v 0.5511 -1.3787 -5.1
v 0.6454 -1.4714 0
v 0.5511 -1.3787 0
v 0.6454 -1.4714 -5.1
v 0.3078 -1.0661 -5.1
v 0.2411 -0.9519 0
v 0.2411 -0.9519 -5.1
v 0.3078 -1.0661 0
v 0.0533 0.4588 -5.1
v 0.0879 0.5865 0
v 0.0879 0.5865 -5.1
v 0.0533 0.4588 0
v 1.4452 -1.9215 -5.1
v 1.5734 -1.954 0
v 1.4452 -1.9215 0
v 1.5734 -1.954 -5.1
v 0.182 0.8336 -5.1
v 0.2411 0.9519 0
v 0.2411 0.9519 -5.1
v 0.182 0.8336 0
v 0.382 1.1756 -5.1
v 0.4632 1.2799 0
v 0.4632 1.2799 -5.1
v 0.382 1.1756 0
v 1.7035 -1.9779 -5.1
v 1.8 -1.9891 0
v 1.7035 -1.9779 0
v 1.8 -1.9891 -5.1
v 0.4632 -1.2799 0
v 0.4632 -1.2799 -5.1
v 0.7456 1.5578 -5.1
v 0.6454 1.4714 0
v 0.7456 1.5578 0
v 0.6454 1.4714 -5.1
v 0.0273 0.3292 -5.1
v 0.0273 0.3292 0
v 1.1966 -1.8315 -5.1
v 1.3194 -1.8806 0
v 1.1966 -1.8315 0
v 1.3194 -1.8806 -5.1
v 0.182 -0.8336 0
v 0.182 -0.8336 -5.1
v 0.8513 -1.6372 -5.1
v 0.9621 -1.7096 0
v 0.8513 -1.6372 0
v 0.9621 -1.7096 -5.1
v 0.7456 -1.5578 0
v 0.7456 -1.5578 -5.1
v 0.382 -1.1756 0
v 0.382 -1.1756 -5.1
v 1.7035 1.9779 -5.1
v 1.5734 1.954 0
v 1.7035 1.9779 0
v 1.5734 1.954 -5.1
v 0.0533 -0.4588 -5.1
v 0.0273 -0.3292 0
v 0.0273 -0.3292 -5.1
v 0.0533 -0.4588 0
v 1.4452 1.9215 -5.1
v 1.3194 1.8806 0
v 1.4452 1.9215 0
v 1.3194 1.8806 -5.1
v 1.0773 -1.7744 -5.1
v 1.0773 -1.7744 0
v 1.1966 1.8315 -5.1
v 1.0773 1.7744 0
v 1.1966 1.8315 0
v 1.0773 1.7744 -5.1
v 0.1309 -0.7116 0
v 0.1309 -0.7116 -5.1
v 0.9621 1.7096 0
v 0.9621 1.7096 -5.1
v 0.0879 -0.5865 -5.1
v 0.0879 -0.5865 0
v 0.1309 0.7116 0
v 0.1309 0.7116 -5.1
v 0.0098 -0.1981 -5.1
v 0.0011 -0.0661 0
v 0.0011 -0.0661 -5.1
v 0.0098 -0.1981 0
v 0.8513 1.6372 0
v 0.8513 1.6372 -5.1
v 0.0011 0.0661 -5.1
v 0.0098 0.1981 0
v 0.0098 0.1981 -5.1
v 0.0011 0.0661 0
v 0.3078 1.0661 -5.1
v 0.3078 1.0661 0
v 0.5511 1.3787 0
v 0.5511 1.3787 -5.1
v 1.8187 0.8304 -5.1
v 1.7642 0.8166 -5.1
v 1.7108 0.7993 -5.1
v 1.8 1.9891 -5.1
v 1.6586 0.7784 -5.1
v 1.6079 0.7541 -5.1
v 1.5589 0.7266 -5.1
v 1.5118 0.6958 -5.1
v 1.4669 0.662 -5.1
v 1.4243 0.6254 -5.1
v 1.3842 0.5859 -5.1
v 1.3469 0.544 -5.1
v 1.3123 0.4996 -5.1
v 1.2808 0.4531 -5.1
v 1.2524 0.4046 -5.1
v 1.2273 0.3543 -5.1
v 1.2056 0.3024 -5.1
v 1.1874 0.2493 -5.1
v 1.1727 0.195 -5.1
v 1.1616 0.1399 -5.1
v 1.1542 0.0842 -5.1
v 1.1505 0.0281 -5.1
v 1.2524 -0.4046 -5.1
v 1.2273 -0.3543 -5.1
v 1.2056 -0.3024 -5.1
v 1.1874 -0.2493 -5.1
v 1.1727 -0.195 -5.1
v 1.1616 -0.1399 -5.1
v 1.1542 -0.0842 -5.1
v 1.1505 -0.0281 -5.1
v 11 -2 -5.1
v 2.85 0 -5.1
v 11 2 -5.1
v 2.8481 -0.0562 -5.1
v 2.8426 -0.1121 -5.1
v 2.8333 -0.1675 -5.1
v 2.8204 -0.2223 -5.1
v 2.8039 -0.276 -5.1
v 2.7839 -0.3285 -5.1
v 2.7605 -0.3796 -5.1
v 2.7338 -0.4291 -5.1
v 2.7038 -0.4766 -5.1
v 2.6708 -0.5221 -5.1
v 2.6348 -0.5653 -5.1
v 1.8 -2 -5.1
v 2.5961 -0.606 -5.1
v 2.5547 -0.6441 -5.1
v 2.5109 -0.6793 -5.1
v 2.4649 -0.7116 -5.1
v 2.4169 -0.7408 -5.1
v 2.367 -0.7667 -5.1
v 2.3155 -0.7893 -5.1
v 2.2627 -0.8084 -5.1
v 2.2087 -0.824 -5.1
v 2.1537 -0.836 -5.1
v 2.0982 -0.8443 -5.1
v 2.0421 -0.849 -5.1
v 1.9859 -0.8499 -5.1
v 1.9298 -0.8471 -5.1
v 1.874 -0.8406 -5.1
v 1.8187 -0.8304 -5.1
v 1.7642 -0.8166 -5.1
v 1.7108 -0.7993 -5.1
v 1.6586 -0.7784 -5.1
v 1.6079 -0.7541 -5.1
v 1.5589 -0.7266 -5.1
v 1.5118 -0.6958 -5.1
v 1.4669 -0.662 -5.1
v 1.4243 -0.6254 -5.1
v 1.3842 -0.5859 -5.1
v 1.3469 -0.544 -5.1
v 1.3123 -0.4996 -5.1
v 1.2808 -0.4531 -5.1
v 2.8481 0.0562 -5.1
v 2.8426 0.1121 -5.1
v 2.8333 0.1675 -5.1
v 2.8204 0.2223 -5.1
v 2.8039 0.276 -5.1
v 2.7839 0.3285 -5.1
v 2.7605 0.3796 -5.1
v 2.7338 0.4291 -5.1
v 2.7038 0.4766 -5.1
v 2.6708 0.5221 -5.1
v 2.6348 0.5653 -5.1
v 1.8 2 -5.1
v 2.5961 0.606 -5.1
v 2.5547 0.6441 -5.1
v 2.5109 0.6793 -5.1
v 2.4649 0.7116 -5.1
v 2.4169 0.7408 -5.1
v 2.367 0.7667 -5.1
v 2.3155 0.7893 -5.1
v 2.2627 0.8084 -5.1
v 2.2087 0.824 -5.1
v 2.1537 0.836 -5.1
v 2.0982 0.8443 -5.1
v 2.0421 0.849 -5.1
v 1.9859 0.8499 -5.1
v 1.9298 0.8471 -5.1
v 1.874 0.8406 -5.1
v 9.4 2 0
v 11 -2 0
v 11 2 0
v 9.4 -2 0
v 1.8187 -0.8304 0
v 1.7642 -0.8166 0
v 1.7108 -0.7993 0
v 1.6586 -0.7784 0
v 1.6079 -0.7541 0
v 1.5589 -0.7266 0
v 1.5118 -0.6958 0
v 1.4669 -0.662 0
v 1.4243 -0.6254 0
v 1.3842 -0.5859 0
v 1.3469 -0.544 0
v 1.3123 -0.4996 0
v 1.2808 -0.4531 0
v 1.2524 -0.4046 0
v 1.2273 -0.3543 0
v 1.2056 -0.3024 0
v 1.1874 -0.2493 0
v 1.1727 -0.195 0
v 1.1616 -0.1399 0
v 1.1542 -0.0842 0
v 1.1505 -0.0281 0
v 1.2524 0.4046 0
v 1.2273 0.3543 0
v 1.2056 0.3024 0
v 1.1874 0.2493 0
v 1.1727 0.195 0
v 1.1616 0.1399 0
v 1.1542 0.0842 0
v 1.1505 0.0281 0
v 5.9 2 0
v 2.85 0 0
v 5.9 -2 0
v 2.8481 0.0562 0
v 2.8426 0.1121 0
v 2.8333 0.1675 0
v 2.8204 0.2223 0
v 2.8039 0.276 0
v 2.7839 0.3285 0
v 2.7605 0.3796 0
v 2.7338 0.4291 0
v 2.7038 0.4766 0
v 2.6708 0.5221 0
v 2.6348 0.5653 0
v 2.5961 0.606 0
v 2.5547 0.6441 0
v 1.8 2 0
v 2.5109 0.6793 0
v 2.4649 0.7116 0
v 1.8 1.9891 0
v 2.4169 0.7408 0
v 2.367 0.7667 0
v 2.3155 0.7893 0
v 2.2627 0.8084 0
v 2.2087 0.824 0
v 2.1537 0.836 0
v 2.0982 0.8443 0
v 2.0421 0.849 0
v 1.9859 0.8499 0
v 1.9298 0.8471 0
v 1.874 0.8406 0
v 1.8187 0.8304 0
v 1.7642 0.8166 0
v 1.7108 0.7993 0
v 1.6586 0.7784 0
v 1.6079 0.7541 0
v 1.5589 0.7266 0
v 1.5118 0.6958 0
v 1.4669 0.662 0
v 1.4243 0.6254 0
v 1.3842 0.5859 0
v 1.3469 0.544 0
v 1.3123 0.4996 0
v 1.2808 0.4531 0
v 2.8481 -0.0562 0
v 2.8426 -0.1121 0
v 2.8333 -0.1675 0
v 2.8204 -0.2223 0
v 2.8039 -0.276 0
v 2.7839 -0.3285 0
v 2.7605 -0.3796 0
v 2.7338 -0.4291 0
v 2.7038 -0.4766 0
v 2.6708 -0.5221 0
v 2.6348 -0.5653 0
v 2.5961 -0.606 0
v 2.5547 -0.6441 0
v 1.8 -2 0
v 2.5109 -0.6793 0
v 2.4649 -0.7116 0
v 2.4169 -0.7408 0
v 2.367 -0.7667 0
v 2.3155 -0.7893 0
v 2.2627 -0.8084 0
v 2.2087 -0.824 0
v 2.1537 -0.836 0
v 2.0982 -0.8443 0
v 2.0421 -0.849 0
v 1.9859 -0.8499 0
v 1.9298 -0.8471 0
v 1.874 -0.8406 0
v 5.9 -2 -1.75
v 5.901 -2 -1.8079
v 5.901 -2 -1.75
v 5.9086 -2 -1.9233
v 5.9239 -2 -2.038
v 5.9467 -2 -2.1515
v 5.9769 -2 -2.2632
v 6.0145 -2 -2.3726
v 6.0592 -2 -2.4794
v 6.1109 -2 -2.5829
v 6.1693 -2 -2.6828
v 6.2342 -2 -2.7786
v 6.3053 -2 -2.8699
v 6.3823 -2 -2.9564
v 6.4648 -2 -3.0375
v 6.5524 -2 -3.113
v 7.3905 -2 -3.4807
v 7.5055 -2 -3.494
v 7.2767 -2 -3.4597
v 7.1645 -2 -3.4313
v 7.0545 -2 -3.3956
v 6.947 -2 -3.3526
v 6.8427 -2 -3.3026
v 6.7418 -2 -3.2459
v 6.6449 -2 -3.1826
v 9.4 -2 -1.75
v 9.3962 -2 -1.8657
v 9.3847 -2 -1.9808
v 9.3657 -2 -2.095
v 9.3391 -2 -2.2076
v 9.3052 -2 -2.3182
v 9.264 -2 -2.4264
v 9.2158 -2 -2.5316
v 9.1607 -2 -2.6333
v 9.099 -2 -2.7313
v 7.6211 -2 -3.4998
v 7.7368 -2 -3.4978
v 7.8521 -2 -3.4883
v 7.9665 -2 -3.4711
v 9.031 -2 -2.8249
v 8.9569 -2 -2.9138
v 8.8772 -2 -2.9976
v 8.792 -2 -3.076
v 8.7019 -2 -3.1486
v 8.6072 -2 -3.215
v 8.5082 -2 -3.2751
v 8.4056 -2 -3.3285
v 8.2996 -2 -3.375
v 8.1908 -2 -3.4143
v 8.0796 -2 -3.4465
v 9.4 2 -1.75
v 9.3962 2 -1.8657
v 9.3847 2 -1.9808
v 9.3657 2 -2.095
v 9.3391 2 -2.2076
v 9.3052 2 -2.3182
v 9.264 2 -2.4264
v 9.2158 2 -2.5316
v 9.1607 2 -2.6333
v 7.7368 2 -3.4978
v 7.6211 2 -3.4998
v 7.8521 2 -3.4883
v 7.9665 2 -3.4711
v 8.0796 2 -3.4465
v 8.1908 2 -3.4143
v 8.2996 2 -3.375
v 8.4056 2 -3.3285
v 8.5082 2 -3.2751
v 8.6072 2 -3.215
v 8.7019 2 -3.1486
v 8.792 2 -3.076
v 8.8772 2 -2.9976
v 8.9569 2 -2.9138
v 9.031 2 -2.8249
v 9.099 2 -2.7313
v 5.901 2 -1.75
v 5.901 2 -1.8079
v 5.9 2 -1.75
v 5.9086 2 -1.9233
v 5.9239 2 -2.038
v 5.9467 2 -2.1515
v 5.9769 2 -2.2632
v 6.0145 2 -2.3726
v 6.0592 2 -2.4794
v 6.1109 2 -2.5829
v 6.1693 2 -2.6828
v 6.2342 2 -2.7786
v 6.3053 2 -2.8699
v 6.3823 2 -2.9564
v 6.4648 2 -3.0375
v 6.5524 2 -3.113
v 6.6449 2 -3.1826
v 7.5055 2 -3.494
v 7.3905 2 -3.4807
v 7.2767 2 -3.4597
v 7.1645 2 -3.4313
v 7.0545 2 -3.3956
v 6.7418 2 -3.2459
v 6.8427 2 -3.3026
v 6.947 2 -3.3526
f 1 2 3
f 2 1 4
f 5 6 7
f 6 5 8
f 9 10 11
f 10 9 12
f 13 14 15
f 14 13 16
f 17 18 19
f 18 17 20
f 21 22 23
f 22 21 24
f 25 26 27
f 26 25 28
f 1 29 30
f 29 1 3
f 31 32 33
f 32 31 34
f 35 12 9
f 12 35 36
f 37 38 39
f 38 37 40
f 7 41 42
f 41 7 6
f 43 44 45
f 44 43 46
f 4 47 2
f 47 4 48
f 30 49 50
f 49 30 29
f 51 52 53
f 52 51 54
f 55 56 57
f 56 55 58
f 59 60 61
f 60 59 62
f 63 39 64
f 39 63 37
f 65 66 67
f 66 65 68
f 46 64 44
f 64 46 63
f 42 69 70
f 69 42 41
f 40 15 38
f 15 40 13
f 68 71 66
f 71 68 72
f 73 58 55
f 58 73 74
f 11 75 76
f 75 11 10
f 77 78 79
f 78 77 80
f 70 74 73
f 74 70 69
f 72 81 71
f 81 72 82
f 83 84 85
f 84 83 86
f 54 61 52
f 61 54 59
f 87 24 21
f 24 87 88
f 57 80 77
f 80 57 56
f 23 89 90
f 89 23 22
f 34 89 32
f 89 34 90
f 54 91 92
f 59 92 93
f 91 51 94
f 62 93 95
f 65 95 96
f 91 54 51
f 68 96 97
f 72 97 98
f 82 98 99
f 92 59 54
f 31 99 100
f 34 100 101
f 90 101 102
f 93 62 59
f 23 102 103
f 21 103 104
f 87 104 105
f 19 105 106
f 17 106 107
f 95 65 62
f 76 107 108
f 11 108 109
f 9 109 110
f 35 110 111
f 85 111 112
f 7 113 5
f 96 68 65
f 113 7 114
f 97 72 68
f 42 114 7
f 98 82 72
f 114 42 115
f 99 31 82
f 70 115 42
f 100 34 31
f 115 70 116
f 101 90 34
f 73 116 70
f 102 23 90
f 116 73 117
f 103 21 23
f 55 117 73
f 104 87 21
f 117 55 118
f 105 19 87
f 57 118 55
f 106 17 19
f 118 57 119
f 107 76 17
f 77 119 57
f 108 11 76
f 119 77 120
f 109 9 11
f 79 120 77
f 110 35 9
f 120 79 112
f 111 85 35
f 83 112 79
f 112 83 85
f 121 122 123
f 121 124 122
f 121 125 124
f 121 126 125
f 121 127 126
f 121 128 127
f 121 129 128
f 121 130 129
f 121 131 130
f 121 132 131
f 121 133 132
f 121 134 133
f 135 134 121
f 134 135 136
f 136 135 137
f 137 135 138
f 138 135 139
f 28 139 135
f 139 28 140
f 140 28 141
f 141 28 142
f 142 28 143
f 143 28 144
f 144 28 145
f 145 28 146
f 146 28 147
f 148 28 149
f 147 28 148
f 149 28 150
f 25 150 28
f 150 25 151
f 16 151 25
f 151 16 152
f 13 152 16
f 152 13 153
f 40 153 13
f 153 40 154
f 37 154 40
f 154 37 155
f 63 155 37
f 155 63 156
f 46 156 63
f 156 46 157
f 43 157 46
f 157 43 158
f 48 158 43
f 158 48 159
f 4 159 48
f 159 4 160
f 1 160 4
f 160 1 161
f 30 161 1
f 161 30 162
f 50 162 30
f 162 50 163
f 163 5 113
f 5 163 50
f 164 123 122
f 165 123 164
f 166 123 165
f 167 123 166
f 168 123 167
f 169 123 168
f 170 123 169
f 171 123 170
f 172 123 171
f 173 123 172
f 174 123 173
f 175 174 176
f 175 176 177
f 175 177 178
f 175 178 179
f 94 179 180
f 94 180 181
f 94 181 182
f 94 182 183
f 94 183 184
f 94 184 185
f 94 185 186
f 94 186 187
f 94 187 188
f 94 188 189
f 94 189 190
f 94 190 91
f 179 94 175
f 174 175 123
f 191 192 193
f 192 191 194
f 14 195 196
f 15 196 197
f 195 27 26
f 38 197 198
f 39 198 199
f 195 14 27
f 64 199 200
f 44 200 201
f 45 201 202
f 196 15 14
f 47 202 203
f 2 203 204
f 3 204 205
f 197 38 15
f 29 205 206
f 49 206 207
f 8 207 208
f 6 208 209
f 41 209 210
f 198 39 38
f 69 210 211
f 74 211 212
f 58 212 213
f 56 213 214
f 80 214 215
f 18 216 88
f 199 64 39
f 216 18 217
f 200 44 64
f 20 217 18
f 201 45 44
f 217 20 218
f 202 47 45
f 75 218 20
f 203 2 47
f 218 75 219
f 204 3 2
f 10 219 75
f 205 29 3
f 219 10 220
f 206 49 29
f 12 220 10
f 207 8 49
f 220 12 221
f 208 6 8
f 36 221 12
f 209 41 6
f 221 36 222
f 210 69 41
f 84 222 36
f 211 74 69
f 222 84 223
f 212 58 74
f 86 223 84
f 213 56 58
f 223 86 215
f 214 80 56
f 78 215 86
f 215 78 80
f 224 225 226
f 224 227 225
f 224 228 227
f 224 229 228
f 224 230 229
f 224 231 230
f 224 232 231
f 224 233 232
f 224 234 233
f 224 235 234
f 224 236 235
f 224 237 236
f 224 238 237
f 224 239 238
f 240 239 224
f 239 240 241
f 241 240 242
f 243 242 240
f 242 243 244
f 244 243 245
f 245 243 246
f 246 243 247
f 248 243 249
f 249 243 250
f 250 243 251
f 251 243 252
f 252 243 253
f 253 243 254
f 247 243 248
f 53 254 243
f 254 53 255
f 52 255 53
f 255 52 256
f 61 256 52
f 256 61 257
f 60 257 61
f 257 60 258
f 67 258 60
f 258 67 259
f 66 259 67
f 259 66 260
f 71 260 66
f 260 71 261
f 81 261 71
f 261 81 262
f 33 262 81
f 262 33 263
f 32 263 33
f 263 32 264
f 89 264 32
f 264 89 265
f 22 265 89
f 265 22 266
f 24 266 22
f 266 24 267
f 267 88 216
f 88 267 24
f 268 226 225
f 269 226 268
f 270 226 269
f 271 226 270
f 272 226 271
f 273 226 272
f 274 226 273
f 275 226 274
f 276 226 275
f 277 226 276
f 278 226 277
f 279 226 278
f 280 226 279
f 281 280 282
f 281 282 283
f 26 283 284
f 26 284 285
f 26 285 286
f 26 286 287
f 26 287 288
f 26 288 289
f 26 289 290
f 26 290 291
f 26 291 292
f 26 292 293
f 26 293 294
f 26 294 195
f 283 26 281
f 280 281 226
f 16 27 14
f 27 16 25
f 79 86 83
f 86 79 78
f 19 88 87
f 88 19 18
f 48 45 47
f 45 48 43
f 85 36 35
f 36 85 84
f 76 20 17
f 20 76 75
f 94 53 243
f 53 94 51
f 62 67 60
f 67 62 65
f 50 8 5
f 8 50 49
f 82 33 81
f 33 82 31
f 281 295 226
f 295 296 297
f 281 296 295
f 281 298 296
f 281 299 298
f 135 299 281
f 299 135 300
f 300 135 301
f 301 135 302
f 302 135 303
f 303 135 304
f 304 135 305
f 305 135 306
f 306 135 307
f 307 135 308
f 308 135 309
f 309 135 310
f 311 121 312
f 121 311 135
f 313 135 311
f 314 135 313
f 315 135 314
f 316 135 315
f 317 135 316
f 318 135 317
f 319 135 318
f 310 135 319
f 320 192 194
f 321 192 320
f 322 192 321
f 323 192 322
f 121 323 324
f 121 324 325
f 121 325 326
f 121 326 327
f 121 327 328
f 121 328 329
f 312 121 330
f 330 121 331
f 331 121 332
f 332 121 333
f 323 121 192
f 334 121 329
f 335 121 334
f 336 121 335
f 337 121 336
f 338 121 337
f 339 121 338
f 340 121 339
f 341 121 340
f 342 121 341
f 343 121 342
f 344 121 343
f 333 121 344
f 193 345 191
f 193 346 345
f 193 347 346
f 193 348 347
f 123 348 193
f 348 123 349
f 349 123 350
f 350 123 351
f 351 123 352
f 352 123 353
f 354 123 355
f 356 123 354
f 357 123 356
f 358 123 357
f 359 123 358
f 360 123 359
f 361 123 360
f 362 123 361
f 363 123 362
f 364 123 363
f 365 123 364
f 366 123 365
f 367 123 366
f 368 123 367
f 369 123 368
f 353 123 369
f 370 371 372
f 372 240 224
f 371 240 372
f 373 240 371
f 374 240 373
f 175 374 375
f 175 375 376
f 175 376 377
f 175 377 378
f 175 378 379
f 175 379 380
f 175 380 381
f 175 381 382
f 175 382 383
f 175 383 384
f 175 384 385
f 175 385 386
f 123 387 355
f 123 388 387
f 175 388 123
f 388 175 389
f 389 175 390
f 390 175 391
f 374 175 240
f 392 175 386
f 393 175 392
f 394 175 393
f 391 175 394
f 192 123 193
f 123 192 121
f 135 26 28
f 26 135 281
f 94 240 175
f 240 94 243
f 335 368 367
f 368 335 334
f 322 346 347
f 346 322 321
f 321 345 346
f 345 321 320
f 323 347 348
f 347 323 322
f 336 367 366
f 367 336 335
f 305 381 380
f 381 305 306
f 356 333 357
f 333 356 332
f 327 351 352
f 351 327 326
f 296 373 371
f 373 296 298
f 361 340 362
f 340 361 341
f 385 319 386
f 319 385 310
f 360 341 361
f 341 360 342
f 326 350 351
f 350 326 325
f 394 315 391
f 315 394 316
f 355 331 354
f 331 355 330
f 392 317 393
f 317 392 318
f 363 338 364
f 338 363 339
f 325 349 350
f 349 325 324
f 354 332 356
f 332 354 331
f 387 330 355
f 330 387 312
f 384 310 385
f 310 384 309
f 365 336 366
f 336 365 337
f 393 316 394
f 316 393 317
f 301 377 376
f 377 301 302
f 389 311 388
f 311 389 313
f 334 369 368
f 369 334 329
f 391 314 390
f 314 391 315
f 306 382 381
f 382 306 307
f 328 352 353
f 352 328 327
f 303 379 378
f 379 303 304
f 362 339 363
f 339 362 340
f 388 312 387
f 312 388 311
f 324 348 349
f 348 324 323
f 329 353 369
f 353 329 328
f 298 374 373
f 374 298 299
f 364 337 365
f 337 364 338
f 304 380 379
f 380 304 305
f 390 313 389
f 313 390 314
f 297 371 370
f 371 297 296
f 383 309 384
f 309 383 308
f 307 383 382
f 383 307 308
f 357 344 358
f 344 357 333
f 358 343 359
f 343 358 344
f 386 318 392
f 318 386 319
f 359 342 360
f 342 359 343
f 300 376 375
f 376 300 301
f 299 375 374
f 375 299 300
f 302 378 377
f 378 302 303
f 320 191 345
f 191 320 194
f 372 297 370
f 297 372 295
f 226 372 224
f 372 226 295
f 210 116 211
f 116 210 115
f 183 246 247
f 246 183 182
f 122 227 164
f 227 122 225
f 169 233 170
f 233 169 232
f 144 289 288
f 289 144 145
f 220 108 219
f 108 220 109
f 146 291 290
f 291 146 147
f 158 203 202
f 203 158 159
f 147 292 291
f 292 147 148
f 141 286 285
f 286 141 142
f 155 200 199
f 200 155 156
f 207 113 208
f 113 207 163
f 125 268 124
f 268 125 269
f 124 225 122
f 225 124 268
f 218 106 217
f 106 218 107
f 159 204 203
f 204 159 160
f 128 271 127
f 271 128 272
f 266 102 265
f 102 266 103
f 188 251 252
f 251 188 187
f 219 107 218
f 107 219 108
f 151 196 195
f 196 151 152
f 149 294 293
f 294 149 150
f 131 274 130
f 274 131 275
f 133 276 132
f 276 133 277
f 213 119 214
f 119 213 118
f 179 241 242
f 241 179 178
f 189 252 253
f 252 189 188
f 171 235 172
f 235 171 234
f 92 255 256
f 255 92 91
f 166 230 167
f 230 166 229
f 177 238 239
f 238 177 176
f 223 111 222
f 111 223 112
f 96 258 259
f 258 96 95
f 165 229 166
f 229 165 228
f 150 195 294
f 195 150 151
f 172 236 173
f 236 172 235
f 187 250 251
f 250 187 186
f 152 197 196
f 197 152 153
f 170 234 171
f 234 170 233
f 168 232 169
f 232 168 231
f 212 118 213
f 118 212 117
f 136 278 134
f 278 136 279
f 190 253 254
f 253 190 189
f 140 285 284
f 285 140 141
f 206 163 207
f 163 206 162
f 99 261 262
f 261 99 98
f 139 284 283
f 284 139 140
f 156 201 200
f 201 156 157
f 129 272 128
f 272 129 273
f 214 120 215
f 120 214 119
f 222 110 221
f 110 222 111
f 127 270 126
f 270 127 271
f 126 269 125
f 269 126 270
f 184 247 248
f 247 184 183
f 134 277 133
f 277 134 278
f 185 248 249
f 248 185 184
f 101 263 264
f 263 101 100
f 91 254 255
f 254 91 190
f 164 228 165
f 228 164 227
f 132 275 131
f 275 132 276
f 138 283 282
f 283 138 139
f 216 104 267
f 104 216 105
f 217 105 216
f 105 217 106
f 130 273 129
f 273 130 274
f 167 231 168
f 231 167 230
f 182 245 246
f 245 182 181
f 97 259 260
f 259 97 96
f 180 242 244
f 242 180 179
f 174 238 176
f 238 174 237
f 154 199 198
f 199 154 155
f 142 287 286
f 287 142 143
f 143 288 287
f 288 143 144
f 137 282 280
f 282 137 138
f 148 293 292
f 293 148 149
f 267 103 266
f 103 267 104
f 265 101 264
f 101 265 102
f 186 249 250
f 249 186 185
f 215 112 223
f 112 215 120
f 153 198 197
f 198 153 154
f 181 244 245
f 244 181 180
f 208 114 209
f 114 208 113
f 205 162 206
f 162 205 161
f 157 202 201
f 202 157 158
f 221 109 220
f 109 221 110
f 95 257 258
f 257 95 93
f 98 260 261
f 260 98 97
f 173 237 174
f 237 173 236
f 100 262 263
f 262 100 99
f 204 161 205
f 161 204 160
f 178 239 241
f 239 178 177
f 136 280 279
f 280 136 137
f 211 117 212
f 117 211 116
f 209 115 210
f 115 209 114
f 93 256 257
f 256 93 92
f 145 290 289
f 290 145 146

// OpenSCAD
// Cable holder v1.0
// Copyright (c)2022 DaTT.cz
// https://www.printables.com/model/272519-drzak-plocheho-kabelu-flat-cable-holder-openscad-p
// Creative Commons (4.0 International License)
// Updated by Mikael Hakansson for nail in cable holder
//-------------------------

//edit setting: 
length           =  11; //holder size
width            = 4.0; //holder width
material         = 1.6; //material width
cabel_x          = 6.0; //cable X
cabel_z          = 3.5; //cable Z
cabel_d          = 3.5; // Diameter for rount cable;
hole             = 1.7; //nail bottom hole diameter
countersink      = hole; //nail countersink diameter
cable            = "round";

//end of setting
//=================================
$fn=95;

module nail_cabel(){
    difference(){
        union(){
            translate([width/2,0,0]) cylinder(h=material+cabel_z, d=width);
            translate([width/2,-width/2,0]) cube([length-width/2-material-cabel_x, width, material+cabel_z]);
            translate([length-(cabel_x+material*2),-width/2,0]) cube([cabel_x+material*2,width,cabel_z+material]);
        }
        if (cable == "round")            
        {    
            translate([length-(cabel_d/2+material),-width/2,cabel_d/2])rotate([90,0,0])cylinder(d=cabel_d,h=width*10,center=true);
            translate([length-(cabel_d+material),-width/2,0]) cube([cabel_d,width,cabel_d/2]);
        }
        else
            translate([length-(cabel_x+material),-width/2,0]) cube([cabel_x,width,cabel_z]);
        translate([width/2,0,material]) cylinder(h=material+cabel_z, d=countersink);
        translate([width/2,0,0]) cylinder(h=material, d1=hole, d2=countersink);
    }
    //translate([length-(cabel_x/2+material/2),-width/2,0]) rotate([90,0,0])cylinder(d=cabel_x,h=width*10,center=true);
}   
  
//Print it upside down to avoid bridge
rotate([180,0,0]) nail_cabel();
